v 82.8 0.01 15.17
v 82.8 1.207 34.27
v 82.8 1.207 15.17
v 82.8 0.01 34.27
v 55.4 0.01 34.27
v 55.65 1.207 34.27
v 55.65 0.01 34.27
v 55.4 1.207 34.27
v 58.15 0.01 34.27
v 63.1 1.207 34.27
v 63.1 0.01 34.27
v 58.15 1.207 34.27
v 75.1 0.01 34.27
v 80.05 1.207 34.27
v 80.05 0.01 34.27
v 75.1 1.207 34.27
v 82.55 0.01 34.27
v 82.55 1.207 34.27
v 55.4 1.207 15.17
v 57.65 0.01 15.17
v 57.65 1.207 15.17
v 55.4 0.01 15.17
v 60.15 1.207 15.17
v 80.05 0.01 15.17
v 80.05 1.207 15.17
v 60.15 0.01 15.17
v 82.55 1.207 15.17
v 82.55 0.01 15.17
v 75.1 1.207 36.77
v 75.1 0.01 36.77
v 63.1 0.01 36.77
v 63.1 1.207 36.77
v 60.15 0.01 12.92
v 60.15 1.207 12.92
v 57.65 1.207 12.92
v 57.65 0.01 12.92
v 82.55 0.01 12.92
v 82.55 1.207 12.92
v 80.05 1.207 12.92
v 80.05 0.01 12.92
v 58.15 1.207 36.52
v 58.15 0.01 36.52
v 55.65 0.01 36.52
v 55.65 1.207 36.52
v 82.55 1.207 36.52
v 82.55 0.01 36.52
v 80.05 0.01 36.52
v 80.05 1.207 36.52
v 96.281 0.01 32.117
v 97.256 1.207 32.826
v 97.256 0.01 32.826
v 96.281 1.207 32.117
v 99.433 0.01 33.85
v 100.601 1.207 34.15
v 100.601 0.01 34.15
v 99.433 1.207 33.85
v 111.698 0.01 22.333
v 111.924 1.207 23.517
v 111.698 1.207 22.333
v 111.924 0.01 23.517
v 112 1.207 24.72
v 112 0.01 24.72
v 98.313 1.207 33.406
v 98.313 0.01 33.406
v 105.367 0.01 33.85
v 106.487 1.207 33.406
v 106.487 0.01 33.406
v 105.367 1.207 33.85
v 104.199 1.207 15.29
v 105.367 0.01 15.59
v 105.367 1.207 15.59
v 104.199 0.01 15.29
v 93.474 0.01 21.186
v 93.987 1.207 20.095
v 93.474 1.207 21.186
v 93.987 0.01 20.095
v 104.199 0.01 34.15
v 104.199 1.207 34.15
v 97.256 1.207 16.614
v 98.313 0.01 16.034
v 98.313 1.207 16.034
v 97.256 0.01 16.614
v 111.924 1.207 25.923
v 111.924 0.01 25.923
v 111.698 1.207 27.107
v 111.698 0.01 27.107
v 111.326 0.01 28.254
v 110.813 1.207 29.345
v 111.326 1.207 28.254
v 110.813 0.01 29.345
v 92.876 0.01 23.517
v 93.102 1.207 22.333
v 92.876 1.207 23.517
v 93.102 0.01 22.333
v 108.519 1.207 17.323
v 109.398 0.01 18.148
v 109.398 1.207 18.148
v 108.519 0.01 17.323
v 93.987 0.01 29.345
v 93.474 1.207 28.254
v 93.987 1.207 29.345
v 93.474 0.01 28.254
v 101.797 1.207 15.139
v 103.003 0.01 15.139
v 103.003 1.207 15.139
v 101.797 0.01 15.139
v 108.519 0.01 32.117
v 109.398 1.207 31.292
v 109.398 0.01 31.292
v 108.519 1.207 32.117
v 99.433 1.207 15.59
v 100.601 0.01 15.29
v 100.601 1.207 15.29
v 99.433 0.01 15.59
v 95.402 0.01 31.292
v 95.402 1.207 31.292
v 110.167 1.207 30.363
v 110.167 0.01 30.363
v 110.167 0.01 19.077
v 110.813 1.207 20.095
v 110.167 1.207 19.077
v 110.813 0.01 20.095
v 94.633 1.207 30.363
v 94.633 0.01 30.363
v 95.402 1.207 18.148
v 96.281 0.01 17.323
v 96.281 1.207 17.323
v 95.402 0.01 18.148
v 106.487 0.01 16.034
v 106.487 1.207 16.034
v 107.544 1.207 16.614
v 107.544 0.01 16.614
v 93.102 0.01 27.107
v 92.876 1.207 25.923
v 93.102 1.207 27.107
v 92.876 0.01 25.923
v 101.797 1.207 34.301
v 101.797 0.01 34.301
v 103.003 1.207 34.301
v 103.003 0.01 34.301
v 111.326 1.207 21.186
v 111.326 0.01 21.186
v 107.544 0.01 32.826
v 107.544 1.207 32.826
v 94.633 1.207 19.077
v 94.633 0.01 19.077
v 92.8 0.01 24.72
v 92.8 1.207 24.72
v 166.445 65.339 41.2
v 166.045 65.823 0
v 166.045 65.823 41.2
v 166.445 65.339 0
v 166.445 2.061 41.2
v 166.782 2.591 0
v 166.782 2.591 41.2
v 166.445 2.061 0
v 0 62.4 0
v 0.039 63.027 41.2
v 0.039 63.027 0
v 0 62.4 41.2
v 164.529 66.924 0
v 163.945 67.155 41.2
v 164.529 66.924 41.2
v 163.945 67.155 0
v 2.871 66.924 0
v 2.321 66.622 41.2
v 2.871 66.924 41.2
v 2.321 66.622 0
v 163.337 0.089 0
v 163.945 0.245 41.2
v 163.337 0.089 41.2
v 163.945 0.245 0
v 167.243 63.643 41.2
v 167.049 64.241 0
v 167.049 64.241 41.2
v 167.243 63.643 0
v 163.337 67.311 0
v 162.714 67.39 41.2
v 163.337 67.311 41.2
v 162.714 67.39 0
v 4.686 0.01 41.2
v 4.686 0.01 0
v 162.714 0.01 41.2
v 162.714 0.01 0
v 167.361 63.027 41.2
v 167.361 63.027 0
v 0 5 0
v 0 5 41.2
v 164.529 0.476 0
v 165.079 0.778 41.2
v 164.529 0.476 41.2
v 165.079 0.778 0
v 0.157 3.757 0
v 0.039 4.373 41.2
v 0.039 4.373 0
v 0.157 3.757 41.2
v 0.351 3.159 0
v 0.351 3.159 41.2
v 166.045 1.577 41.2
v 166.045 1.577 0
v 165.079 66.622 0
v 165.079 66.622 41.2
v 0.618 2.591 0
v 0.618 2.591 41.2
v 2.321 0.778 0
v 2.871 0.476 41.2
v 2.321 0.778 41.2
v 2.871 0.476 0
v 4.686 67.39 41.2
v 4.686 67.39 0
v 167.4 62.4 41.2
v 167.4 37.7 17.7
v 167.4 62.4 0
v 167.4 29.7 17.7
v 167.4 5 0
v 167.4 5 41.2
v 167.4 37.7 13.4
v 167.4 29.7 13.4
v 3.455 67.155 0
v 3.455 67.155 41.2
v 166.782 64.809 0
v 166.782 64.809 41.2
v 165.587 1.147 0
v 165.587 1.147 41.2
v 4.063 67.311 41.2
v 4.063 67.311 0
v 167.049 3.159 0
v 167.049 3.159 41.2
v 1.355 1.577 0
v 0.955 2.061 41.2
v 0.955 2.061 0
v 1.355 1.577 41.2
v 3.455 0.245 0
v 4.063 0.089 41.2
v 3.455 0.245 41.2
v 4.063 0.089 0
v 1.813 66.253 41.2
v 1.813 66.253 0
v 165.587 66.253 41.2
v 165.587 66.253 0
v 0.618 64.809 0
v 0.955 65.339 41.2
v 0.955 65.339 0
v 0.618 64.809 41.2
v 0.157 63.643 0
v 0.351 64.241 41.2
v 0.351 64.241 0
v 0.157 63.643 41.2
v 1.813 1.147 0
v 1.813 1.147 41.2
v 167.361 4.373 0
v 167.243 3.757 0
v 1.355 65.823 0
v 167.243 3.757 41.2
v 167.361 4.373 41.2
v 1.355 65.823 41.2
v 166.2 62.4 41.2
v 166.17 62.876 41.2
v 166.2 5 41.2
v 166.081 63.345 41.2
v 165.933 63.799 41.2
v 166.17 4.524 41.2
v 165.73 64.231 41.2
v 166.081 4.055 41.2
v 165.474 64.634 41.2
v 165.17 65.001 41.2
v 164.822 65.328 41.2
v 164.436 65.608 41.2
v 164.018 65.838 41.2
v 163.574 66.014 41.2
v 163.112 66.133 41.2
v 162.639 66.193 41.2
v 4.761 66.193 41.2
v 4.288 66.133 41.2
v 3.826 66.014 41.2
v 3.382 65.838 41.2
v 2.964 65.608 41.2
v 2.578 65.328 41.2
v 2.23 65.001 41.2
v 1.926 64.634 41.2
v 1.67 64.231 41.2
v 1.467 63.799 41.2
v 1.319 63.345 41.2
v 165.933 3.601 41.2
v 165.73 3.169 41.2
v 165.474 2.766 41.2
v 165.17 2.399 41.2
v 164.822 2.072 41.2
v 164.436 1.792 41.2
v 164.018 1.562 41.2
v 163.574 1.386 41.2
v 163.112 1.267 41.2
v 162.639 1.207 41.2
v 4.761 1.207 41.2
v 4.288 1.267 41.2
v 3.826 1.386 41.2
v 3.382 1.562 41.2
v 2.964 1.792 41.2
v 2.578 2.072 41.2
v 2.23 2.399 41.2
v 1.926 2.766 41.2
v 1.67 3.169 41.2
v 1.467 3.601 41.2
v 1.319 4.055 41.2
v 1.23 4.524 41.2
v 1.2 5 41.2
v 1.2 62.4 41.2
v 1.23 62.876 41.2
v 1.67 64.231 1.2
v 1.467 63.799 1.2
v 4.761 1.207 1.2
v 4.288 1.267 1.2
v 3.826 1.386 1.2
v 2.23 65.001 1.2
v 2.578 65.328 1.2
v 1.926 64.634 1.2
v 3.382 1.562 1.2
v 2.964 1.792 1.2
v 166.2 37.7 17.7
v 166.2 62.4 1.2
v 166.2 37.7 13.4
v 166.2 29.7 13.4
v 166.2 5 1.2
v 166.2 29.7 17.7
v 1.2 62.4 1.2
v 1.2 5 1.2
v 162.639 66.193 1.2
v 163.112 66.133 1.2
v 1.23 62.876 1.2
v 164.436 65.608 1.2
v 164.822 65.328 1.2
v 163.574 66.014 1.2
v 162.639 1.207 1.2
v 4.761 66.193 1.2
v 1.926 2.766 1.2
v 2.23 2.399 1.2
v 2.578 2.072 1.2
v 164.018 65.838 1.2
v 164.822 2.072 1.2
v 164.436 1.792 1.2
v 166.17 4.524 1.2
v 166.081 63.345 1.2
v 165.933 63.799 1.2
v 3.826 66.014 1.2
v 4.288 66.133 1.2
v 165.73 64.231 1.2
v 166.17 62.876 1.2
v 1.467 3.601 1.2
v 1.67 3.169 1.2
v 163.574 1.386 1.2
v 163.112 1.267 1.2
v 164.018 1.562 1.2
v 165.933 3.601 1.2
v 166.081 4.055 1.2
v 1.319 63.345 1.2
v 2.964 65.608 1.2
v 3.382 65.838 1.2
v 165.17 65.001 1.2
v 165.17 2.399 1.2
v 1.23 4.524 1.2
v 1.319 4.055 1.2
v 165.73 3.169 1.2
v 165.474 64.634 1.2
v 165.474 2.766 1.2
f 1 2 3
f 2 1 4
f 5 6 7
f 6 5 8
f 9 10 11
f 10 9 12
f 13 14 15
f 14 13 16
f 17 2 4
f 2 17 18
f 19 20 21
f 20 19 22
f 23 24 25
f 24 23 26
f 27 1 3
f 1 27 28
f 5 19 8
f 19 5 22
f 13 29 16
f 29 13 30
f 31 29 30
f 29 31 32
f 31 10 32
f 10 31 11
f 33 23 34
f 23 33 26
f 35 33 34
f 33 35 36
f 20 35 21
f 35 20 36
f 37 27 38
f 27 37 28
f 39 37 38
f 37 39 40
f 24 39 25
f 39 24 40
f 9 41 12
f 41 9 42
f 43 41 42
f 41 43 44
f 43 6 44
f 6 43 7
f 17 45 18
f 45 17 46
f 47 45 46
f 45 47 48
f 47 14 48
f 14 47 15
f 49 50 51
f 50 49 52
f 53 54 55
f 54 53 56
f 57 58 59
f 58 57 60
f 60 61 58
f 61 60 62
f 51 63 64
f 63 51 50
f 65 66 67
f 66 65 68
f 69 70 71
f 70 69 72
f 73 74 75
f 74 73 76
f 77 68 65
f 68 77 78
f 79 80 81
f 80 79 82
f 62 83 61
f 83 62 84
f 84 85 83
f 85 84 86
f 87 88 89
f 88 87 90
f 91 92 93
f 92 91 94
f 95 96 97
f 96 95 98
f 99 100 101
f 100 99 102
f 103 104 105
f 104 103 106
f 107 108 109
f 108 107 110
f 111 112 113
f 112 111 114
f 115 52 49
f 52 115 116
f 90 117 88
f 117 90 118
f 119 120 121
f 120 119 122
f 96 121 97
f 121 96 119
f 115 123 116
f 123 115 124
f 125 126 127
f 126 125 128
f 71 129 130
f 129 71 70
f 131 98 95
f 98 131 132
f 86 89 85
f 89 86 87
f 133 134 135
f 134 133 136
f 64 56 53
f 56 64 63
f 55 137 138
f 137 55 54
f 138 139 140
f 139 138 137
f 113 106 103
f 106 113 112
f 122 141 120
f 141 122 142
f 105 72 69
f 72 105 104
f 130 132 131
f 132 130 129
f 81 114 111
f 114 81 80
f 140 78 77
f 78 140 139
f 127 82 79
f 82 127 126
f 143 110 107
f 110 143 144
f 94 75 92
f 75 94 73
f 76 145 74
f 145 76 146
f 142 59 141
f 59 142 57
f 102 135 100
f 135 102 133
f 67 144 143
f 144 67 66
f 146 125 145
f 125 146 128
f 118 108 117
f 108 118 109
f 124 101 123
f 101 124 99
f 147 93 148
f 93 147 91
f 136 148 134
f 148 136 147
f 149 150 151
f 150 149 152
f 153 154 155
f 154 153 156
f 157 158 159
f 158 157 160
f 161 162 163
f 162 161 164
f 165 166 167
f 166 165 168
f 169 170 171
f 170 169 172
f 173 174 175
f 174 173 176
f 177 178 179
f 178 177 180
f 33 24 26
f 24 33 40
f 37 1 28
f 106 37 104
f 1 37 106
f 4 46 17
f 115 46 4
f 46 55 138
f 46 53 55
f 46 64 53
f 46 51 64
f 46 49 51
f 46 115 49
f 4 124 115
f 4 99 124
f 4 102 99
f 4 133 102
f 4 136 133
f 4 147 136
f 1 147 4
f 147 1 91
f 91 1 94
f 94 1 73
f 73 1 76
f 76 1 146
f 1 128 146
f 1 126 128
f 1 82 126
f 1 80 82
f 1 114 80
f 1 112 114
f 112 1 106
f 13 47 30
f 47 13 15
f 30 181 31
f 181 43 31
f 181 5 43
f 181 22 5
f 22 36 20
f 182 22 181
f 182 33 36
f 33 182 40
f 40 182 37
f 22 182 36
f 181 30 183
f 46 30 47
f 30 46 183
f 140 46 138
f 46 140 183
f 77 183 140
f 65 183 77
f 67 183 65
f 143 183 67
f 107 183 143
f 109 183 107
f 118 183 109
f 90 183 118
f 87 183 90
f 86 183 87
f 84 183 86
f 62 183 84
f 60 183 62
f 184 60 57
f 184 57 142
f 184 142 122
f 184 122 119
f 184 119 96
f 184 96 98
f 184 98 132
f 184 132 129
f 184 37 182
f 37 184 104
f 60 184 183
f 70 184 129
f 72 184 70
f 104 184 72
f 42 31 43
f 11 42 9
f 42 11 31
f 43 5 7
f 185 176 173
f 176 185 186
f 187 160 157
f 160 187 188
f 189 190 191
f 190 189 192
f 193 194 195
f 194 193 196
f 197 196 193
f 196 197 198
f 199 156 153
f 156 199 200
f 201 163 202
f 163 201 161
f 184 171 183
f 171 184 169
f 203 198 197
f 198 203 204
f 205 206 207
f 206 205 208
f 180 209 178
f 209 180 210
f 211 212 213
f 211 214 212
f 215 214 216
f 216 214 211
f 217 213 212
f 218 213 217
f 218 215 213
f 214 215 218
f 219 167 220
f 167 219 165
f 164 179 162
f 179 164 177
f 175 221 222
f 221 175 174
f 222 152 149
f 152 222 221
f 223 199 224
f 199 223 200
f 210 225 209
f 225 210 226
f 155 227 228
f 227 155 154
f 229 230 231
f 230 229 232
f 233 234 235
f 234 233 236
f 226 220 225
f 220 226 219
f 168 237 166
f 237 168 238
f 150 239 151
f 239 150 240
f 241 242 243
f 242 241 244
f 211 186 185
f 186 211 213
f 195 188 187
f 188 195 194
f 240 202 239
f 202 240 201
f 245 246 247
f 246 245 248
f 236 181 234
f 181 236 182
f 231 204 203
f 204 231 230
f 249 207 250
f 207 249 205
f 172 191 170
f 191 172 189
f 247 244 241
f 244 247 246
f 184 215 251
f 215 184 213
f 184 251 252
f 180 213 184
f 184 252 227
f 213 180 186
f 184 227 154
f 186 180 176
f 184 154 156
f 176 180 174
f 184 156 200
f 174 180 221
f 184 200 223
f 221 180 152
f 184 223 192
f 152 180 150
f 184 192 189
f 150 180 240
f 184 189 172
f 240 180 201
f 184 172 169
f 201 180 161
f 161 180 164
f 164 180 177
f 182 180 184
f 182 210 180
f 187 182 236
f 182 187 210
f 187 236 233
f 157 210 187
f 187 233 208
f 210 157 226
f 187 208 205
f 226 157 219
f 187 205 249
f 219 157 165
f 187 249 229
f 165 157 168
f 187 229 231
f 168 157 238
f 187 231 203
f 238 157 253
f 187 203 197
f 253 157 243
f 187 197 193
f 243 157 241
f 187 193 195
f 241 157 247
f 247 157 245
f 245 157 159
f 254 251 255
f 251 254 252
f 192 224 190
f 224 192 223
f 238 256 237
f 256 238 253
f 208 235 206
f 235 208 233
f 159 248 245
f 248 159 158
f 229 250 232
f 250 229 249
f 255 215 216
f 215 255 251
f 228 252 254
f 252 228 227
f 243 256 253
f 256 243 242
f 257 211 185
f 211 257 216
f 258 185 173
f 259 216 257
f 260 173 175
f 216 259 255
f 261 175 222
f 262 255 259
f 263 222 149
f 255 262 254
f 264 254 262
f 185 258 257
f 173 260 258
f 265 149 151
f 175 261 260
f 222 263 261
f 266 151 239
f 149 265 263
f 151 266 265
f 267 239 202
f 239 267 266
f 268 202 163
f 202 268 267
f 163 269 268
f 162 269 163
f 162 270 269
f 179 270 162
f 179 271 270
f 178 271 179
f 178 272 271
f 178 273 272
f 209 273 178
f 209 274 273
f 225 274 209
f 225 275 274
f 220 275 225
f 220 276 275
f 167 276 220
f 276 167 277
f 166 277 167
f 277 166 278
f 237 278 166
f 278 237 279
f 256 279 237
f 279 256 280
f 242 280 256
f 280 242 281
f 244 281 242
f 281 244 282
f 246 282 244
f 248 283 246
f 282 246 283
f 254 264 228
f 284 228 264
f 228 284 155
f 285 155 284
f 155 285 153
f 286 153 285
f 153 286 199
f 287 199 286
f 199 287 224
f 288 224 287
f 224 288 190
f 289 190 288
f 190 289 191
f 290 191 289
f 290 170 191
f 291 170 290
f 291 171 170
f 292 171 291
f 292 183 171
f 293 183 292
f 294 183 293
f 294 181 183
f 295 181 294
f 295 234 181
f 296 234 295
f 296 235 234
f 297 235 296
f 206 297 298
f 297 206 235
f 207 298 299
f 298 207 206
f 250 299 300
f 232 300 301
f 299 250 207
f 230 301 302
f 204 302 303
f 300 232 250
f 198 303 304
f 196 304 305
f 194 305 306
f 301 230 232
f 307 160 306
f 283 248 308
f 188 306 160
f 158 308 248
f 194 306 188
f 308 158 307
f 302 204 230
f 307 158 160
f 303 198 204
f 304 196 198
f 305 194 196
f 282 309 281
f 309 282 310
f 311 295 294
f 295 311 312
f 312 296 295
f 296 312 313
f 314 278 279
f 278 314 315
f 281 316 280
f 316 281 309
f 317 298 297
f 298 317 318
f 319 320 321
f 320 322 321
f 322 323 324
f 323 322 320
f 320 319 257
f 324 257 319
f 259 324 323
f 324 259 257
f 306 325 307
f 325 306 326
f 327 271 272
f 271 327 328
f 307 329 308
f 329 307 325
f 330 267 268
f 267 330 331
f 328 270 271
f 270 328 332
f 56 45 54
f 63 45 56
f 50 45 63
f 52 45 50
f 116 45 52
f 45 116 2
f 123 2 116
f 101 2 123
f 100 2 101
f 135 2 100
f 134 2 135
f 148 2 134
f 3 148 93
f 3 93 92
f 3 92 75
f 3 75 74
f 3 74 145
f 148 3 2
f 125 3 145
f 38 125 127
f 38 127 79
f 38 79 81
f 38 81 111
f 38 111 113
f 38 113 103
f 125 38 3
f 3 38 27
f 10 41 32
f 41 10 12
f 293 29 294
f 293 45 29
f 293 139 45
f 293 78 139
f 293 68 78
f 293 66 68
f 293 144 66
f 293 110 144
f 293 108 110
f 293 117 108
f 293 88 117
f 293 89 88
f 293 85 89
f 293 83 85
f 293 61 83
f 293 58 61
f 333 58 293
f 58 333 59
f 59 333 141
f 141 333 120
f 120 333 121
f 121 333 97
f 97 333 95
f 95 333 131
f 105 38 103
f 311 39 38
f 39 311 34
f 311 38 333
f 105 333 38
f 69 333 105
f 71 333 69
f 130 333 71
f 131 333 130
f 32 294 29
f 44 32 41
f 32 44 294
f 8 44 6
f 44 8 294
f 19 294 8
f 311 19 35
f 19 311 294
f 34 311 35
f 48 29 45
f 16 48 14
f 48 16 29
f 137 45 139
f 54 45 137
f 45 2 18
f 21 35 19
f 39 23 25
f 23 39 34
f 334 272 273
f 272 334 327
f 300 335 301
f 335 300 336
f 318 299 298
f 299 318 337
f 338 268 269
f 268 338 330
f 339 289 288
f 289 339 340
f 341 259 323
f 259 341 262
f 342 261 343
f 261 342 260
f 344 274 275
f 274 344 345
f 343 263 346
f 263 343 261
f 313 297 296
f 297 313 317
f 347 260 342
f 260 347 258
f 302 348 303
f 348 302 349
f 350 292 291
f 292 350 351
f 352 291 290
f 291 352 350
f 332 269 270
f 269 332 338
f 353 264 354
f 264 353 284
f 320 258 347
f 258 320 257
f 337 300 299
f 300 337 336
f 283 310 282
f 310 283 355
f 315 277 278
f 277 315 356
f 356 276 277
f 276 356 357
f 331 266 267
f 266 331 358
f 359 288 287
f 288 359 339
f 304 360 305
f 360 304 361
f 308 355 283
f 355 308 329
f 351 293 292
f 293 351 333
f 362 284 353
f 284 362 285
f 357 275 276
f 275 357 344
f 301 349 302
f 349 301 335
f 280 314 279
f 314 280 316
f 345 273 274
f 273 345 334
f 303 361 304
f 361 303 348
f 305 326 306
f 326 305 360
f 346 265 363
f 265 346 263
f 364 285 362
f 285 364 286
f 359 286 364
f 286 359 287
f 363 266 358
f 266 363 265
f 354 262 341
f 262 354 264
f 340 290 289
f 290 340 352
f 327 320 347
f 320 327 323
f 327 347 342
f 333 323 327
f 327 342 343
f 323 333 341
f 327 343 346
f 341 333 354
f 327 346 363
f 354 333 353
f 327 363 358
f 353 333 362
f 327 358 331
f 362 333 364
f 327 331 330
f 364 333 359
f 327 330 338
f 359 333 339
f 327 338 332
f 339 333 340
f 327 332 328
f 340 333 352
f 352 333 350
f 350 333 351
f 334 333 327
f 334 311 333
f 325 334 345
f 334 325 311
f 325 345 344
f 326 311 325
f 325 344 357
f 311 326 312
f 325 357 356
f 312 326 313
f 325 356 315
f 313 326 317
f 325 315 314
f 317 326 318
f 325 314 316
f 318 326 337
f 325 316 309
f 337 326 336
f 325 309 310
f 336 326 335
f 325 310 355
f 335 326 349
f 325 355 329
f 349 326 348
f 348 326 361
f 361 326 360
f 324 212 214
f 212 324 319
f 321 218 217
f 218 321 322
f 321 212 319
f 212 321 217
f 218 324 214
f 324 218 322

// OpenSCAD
// Vibrating Alarm Clock Chassis
// Designed for Raspberry Pi on breadboard with OLED display

// Global parameters
$fn = 50; // Resolution for curved surfaces

// Wall thickness
wall_thickness = 1.2;

// Internal dimensions
internal_width = 165;   // Breadboard width + minimal clearance
internal_depth = 65;    // Breadboard depth + Pi + minimal clearance  
internal_height = 40;   // Height for breadboard + Pi + connections

// Button hole diameter (threaded)
button_diameter = 6.7;
button_thread_depth = 3; // Reduced thickness for threading

// OLED display dimensions
oled_width = 27.4;
oled_height = 19.1;
oled_mounting_hole_diameter = 2.5; // Standard M2.5 screws
oled_mounting_spacing_x = 25;      // Approximate spacing between holes
oled_mounting_spacing_y = 15;      // Approximate spacing between holes

// USB port dimensions (micro USB) - increased height clearance
usb_width = 8;
usb_height = 4.3; // Increased by 1mm for clearance

// External dimensions
external_width = internal_width + 2 * wall_thickness;
external_depth = internal_depth + 2 * wall_thickness;
external_height = internal_height + wall_thickness; // Bottom wall

// Top lid thickness (increased for button threading)
top_thickness = wall_thickness + button_thread_depth;

// Wire grommet diameter (increased to 19.2mm)
grommet_diameter = 19.2;

// Corner radius for rounded edges
corner_radius = 5;

// Fitting clearance for 3D printing
fit_clearance = 0.2; // Clearance between lid and main body for good fit

// Lid insert depth (how far the lid goes into the box)
lid_insert_depth = 4; // Small insertion depth for secure fit

// Brim dimensions for lid
brim_width = 2; // Width of the brim around the lid
brim_thickness = 0.8; // Thickness of the brim

// Lip dimensions for removable top (increased clearances for better fit)
lip_height = 1;
lip_thickness = 1.2; // Increased from 0.8 for looser fit

// Main assembly - choose what to render
render_main_body = true;
render_top = false;
render_assembled = false; // Set to true to see assembled view

if (render_assembled) {
    // Assembled view
    main_body();
    translate([0, 0, external_height]) top_lid();
} else {
    // Separate parts for printing
    if (render_main_body) {
        main_body();
    }
    
    if (render_top) {
        translate([0, external_depth * 2 + 15, top_thickness]) 
        rotate([180, 0, 0])
        top_lid();
    }
} 
module main_body() {
    difference() {
        // Main body exterior
        rounded_box(external_width, external_depth, external_height, corner_radius);
        
        // Internal cavity
        translate([wall_thickness, wall_thickness, wall_thickness])
        rounded_box(internal_width, internal_depth, internal_height + 1, corner_radius - wall_thickness);
        
        // Front panel cutouts
        front_panel_cutouts();
        
        // Side panel cutout for Raspberry Pi USB port
        side_panel_cutouts();
    }
}

module top_lid() {
    difference() {
        // Lid that fits inside the box with clearance
        rounded_box(internal_width - 2 * fit_clearance, internal_depth - 2 * fit_clearance, top_thickness, corner_radius - wall_thickness);
        
        // Button hole (threaded)
        translate([internal_width/2, internal_depth/2, -1])
        cylinder(h = top_thickness + 2, d = button_diameter);
    }
}

module front_panel_cutouts() {
    // Calculate positions for side-by-side centered layout
    total_width = oled_width + grommet_diameter + 10; // 10mm spacing between them
    start_x = (external_width - total_width) / 2;
    center_height = external_height * 0.6;
    
    // OLED display cutout (left side of center)
    oled_center_x = start_x + oled_width/2;
    oled_center_z = center_height;
    
    translate([start_x, -1, center_height - oled_height/2])
    cube([oled_width, wall_thickness + 2, oled_height]);
    
    // OLED pin cutout (separate rectangular cutout at same height as top screw holes)
    pin_cutout_width = 12; // Wide enough for 4 pins with spacing
    pin_cutout_height = 3; // Height to clear soldered pins
    pin_cutout_x = start_x + (oled_width - pin_cutout_width) / 2; // Center on OLED
    pin_cutout_z = oled_center_z + oled_height/2 + 1 - pin_cutout_height/2; // Same Z as top screw holes
    
    translate([pin_cutout_x, -1, pin_cutout_z])
    cube([pin_cutout_width, wall_thickness + 2, pin_cutout_height]);
    
    // OLED mounting holes (M2.5 screws) - positioned inside OLED area
    // Inset from edges by 2mm, bottom holes below display cutout
    hole_inset = 1.5;
    bottom_hole_offset = 3; // Distance below display cutout
    hole_depth = wall_thickness + 10; // Extend into internal cavity
    
    // Bottom left
    translate([start_x + hole_inset - oled_mounting_hole_diameter/2 + 2, -1, 2 + oled_center_z - oled_height/2 - bottom_hole_offset - oled_mounting_hole_diameter/2])
    cube([oled_mounting_hole_diameter, hole_depth, oled_mounting_hole_diameter]);
    
    // Bottom right
    translate([start_x + oled_width - hole_inset - oled_mounting_hole_diameter/2, -1, 2+ oled_center_z - oled_height/2 - bottom_hole_offset - oled_mounting_hole_diameter/2])
    cube([oled_mounting_hole_diameter, hole_depth, oled_mounting_hole_diameter]);
    
    // Top left
    translate([start_x + hole_inset - oled_mounting_hole_diameter/2, -1, oled_center_z + oled_height/2 + 1 - oled_mounting_hole_diameter/2])
    cube([oled_mounting_hole_diameter, hole_depth, oled_mounting_hole_diameter]);
    
    // Top right
    translate([start_x + oled_width - hole_inset - oled_mounting_hole_diameter/2, -1, oled_center_z + oled_height/2 + 1- oled_mounting_hole_diameter/2])
    cube([oled_mounting_hole_diameter, hole_depth, oled_mounting_hole_diameter]);
    
    // Wire grommet hole (right side of center)
    translate([start_x + oled_width + 10 + grommet_diameter/2, -1, center_height])
    rotate([-90, 0, 0])
    cylinder(h = wall_thickness + 2, d = grommet_diameter);
}

module side_panel_cutouts() {
    // Raspberry Pi micro USB port cutout on the right side
    // From breadboard bottom: bottom of port at 12.2mm, top at 15.5mm
    translate([external_width - wall_thickness - 1, external_depth/2 - usb_width/2, wall_thickness + 12.2])
    cube([wall_thickness + 2, usb_width, usb_height]);
}

module rounded_box(width, depth, height, radius) {
    hull() {
        // Bottom corners
        translate([radius, radius, 0])
        cylinder(h = height, r = radius);
        
        translate([width - radius, radius, 0])
        cylinder(h = height, r = radius);
        
        translate([radius, depth - radius, 0])
        cylinder(h = height, r = radius);
        
        translate([width - radius, depth - radius, 0])
        cylinder(h = height, r = radius);
    }
}

// Print instructions as comments:
/*
PRINTING INSTRUCTIONS:
1. Print main_body upright (as oriented in separate parts view)
2. Print top_lid upside down (as oriented in separate parts view) - the brim will be on the print bed
3. Use 0.2mm layer height
4. 20-30% infill is sufficient
5. Support material needed for wire grommet hole overhang
6. No supports needed for other features
7. The brim around the lid helps with bed adhesion and provides a snug fit

ASSEMBLY:
1. Place breadboard on bottom inside main body
2. Place Raspberry Pi on breadboard
3. Install OLED display in front cutout
4. Thread motor wire through grommet hole and install grommet
5. Install button through top lid
6. Place top lid on main body - inner part fits inside cavity with 0.2mm clearance

DIMENSIONS:
- External: 176mm x 76mm x 48mm
- Internal cavity: 170mm x 70mm x 45mm
- Wall thickness: 3mm
- Lid has brim for better fit and printing
*/
